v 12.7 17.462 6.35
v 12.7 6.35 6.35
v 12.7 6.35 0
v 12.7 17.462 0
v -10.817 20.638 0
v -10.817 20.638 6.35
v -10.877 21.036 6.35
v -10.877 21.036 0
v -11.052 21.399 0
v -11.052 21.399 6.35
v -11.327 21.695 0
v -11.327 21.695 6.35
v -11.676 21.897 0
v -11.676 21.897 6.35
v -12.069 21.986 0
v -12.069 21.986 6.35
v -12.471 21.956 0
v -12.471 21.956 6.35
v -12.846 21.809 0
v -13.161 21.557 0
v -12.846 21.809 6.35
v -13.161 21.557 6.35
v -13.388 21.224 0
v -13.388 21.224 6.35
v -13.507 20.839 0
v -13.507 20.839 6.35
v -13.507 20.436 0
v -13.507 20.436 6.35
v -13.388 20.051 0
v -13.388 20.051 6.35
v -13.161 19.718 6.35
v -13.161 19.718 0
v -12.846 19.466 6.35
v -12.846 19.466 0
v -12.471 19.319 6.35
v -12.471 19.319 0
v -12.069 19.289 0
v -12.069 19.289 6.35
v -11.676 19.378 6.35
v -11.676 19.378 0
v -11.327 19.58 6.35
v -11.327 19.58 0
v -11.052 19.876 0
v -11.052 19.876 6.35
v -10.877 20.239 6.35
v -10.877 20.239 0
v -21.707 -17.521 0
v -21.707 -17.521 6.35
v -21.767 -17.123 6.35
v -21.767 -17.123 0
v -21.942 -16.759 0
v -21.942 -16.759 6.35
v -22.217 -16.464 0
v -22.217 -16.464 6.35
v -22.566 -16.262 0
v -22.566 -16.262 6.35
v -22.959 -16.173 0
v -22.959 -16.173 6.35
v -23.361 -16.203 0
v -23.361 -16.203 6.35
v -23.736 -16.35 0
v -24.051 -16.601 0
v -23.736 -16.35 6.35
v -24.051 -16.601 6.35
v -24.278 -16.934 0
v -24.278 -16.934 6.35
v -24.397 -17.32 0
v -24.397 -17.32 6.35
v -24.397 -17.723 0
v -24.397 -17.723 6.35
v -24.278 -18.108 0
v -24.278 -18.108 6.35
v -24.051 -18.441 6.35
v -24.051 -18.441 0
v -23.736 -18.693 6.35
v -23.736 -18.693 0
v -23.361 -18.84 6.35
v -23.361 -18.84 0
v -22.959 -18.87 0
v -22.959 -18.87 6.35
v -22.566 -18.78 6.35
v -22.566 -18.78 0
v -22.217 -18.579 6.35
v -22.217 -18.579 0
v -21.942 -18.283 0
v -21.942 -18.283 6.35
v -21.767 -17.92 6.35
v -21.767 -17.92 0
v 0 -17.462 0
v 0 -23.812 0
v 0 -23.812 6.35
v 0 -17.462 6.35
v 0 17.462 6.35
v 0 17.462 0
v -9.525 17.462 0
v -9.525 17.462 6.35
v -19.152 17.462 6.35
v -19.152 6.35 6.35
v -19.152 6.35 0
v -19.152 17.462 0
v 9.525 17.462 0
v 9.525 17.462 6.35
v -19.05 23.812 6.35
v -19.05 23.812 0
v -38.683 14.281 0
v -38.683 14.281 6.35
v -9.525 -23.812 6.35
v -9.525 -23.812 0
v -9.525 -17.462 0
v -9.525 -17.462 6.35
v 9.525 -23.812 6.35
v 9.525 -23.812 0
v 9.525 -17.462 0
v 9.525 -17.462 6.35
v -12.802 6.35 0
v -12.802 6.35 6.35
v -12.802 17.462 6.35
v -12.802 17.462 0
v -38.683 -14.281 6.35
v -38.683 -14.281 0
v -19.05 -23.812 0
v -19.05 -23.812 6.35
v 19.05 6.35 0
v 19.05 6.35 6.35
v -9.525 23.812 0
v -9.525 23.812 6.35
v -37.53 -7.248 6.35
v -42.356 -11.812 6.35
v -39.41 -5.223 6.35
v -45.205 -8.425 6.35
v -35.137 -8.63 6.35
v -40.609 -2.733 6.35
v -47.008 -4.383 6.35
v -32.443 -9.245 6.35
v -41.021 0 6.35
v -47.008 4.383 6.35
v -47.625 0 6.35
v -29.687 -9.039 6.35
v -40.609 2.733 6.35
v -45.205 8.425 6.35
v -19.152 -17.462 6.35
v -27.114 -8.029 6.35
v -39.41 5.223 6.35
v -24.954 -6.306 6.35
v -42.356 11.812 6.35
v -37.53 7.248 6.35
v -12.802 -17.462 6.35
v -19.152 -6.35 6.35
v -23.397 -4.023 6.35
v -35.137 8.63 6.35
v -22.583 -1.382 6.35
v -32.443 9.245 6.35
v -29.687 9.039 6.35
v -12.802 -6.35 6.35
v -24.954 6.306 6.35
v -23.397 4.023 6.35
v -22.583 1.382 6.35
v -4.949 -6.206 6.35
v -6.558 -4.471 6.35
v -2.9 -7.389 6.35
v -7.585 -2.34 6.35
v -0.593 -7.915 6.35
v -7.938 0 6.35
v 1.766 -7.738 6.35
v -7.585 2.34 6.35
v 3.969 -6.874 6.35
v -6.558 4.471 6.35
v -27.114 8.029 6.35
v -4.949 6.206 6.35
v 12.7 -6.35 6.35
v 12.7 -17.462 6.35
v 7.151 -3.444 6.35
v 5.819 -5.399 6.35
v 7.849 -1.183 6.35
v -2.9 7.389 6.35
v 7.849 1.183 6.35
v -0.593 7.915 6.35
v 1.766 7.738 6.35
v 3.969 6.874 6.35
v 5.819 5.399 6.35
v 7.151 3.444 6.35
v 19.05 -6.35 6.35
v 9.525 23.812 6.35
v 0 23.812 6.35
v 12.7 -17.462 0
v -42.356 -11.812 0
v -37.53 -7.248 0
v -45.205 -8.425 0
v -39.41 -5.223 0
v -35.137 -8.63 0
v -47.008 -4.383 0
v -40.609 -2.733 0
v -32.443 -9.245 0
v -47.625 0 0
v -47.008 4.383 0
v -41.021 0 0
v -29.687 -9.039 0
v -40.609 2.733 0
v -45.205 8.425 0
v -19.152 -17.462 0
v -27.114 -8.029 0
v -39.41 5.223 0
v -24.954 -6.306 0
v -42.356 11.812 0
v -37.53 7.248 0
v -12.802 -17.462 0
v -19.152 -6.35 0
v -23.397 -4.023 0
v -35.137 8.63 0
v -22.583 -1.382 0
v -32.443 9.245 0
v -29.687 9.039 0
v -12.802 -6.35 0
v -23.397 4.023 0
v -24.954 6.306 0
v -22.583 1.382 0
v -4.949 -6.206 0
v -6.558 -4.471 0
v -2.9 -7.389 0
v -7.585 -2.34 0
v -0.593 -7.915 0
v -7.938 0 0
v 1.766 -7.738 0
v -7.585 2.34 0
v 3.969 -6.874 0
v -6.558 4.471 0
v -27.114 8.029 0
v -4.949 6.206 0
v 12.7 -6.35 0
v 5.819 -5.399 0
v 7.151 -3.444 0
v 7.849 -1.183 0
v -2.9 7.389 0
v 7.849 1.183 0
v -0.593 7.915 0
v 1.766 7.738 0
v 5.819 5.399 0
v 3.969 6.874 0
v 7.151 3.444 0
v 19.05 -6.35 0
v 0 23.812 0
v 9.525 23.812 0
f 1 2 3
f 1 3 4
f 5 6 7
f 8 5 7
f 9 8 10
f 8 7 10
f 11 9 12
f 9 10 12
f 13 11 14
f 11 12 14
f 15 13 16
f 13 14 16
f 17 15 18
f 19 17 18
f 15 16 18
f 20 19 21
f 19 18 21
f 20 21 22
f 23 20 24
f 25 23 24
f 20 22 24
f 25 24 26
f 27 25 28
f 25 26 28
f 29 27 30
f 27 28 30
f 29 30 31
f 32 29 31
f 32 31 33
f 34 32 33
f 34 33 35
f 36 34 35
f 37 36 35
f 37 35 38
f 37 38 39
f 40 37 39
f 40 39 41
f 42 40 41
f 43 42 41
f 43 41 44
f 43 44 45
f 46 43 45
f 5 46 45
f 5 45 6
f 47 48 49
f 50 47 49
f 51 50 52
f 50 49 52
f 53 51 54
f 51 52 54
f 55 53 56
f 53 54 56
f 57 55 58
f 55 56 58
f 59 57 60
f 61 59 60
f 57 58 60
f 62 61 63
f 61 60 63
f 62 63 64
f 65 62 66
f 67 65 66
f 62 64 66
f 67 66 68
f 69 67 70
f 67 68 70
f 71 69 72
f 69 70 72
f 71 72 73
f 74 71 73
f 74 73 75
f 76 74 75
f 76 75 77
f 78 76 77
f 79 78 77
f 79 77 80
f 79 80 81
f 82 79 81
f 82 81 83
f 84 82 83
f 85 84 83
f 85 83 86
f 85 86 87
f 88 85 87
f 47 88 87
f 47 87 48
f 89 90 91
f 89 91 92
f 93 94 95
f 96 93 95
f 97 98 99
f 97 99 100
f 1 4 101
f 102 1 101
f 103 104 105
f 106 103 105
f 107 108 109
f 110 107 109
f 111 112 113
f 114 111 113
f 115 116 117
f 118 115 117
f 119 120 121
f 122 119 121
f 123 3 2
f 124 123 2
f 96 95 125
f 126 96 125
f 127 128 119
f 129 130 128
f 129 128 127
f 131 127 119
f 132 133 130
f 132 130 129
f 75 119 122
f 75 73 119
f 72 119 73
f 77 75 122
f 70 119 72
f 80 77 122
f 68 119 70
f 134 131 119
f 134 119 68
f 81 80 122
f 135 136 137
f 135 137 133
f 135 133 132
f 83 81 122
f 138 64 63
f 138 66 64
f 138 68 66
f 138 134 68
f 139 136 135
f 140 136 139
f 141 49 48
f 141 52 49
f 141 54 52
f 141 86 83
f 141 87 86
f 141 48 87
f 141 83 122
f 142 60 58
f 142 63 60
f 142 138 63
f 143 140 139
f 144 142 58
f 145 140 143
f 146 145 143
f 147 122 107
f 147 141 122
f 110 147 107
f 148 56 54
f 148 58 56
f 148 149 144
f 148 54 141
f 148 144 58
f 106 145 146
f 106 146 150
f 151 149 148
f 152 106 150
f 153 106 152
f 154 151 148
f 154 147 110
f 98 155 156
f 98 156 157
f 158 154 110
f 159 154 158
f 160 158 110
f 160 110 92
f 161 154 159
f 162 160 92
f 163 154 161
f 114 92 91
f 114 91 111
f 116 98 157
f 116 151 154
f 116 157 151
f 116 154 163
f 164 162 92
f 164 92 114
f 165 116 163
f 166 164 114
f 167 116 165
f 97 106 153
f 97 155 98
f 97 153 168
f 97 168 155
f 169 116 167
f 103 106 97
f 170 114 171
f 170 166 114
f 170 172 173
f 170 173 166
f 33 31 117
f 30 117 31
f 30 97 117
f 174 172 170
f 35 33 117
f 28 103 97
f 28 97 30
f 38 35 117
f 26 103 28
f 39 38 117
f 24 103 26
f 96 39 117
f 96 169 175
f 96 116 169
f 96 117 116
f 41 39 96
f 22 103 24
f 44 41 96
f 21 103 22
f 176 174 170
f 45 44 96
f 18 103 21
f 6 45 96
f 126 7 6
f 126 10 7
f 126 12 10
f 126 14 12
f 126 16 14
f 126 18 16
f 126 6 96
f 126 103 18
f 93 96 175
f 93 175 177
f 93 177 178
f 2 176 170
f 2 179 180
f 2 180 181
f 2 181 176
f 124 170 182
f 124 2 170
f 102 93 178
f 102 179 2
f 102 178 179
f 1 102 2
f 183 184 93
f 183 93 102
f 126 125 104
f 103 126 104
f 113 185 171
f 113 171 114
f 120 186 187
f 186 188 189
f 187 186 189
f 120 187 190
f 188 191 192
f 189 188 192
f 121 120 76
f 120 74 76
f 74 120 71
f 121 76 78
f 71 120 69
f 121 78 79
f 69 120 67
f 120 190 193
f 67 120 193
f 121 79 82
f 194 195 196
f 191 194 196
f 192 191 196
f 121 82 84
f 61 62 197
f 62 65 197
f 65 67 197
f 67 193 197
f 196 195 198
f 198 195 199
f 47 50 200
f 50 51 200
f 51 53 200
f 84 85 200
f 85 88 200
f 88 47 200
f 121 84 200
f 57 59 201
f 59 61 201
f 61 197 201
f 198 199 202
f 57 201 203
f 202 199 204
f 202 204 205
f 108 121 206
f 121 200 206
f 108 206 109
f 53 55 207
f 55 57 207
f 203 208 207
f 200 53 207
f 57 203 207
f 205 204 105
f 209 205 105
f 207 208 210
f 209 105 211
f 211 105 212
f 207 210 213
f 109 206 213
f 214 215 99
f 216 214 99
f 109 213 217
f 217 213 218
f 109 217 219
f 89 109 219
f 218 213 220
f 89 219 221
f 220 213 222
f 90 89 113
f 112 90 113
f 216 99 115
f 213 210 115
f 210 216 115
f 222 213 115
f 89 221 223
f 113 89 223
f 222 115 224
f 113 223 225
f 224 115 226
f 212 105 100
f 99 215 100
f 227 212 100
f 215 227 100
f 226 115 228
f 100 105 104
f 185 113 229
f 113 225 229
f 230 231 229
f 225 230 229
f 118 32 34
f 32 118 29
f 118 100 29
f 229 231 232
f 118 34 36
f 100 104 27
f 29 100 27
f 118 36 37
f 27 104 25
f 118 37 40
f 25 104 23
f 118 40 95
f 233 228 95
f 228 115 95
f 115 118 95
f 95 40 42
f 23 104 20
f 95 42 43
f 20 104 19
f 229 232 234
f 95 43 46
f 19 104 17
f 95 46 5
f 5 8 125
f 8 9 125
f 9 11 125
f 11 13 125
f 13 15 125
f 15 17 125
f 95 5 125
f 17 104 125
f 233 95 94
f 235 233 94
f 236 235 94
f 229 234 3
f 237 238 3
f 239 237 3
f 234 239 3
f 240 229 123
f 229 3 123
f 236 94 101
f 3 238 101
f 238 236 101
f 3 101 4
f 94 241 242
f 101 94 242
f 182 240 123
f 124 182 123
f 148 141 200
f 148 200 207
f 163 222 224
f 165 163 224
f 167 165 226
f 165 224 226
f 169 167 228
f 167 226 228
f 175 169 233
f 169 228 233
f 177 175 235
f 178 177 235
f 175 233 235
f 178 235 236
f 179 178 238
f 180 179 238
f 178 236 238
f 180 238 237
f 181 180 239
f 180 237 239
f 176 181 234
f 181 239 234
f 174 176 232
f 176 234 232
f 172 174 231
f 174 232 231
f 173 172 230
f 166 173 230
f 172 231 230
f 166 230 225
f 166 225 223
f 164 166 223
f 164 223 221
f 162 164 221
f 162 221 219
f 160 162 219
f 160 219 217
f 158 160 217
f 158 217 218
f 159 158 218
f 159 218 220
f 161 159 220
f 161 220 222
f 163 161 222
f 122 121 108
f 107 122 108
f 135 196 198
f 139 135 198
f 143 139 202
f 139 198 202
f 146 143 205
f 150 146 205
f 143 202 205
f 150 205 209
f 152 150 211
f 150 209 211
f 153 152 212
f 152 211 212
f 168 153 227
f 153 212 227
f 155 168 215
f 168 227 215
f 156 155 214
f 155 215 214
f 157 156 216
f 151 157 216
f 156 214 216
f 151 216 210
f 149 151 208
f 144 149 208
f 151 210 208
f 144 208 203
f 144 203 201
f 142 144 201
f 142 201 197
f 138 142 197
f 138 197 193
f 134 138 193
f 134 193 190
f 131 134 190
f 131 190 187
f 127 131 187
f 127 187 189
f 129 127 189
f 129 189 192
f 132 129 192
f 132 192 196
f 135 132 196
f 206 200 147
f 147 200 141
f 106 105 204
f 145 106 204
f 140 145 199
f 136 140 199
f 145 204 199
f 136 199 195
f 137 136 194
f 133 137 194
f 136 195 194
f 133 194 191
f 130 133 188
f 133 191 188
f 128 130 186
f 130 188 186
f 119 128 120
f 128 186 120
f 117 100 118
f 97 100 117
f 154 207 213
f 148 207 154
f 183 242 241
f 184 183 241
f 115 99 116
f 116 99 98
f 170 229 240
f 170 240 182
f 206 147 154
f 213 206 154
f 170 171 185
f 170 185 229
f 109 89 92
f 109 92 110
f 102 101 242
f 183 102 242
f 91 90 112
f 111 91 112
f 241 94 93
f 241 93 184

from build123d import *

# Parameters (mm, degrees)
MASS_DEPTH                = 6.35
SKETCH4_R                 = 9.271
CUT_EXTRUDE1_DEPTH        = 54.623672769
SKETCH3_W                 = 9.525
SKETCH3_H                 = 12.7
CUT_EXTRUDE2_DEPTH        = 54.623672769
LPATTERN1_COUNT           = 2
LPATTERN1_PITCH           = 19.05
CAVITY1_START             = -19.1516
CAVITY1_OUTLINE_W         = 11.1125
CAVITY1_OUTLINE_H         = 6.35
CAVITY1_DEPTH             = 6.35
CAVITY1_START_2           = 12.7
CAVITY1_2_OUTLINE_W       = 11.1125
CAVITY1_2_OUTLINE_H       = 6.35
CAVITY1_2_DEPTH           = 6.35
SKETCH5_R                 = 7.9375
CUT_EXTRUDE3_DEPTH        = 54.623672769
F_6_32_TAPPED_HOLE1_D     = 2.7051
F_6_32_TAPPED_HOLE1_DEPTH = 152.4
F_6_32_TAPPED_HOLE1_TIP   = 0.81269403


# Read off the part's stored shape, not the designer's step: Cavity1
with BuildPart() as part:
    # Sketch1 → Mass (new body)
    with BuildSketch(Plane.XY):
        with BuildLine():
            Line((-19.05, -23.8125), (19.05, -23.8125))
            Line((19.05, -23.8125), (19.05, 23.8125))
            Line((19.05, 23.8125), (-19.05, 23.8125))
            Line((-19.05, 23.8125), (-38.68314018, 14.281008096))
            ThreePointArc((-38.68314018, 14.281008096), (-47.625, 0), (-38.68314018, -14.281008096))
            Line((-38.68314018, -14.281008096), (-19.05, -23.8125))
        make_face()
    extrude(amount=MASS_DEPTH)

    # Sketch4 → Cut-Extrude1 (cut, through all)
    with BuildSketch(Plane(origin=(0, 0, 0), x_dir=(-1, 0, 0), z_dir=(0, 0, -1))):
        with Locations((31.75, 0)):
            Circle(SKETCH4_R)
    extrude(amount=-CUT_EXTRUDE1_DEPTH, mode=Mode.SUBTRACT)

    # Sketch3 → Cut-Extrude2 (cut, through all)
    with BuildSketch(Plane(origin=(0, 0, 0), x_dir=(-1, 0, 0), z_dir=(0, 0, -1))):
        with Locations((-14.2875, 23.8125)):
            Rectangle(SKETCH3_W, SKETCH3_H)
        with Locations((-14.2875, -23.8125)):
            Rectangle(SKETCH3_W, SKETCH3_H)
    cut_extrude2 = extrude(amount=-CUT_EXTRUDE2_DEPTH, mode=Mode.SUBTRACT)

    # LPattern1: Cut-Extrude2 ×2
    with Locations(*[(-i * LPATTERN1_PITCH, 0, 0) for i in range(1, LPATTERN1_COUNT)]):
        add(cut_extrude2, mode=Mode.SUBTRACT)

    # Cavity1 outline → Cavity1 (cut)
    with BuildSketch(Plane.YZ.offset(CAVITY1_START)):
        with Locations((-11.90625, 3.175)):
            Rectangle(CAVITY1_OUTLINE_W, CAVITY1_OUTLINE_H)
        with Locations((11.90625, 3.175)):
            Rectangle(CAVITY1_OUTLINE_W, CAVITY1_OUTLINE_H)
    extrude(amount=CAVITY1_DEPTH, mode=Mode.SUBTRACT)

    # Cavity1 2 outline → Cavity1 2 (cut)
    with BuildSketch(Plane.YZ.offset(CAVITY1_START_2)):
        with Locations((-11.90625, 3.175)):
            Rectangle(CAVITY1_2_OUTLINE_W, CAVITY1_2_OUTLINE_H)
        with Locations((11.90625, 3.175)):
            Rectangle(CAVITY1_2_OUTLINE_W, CAVITY1_2_OUTLINE_H)
    extrude(amount=CAVITY1_2_DEPTH, mode=Mode.SUBTRACT)

    # Sketch5 → Cut-Extrude3 (cut, through all)
    with BuildSketch(Plane(origin=(0, 0, 0), x_dir=(-1, 0, 0), z_dir=(0, 0, -1))):
        Circle(SKETCH5_R)
    extrude(amount=-CUT_EXTRUDE3_DEPTH, mode=Mode.SUBTRACT)

    # #6-32 Tapped Hole1
    with Locations(Plane(origin=(0, 0, 0), x_dir=(-1, 0, 0), z_dir=(0, 0, -1))):
        with Locations((23.059852363, -17.521321241), (12.169849394, 20.6375)):
            Hole(F_6_32_TAPPED_HOLE1_D / 2, depth=F_6_32_TAPPED_HOLE1_DEPTH)
            with Locations((0, 0, -(F_6_32_TAPPED_HOLE1_DEPTH + F_6_32_TAPPED_HOLE1_TIP / 2))):  # 118° drill point
                Cone(0, F_6_32_TAPPED_HOLE1_D / 2, F_6_32_TAPPED_HOLE1_TIP, mode=Mode.SUBTRACT)


solid = part.part
